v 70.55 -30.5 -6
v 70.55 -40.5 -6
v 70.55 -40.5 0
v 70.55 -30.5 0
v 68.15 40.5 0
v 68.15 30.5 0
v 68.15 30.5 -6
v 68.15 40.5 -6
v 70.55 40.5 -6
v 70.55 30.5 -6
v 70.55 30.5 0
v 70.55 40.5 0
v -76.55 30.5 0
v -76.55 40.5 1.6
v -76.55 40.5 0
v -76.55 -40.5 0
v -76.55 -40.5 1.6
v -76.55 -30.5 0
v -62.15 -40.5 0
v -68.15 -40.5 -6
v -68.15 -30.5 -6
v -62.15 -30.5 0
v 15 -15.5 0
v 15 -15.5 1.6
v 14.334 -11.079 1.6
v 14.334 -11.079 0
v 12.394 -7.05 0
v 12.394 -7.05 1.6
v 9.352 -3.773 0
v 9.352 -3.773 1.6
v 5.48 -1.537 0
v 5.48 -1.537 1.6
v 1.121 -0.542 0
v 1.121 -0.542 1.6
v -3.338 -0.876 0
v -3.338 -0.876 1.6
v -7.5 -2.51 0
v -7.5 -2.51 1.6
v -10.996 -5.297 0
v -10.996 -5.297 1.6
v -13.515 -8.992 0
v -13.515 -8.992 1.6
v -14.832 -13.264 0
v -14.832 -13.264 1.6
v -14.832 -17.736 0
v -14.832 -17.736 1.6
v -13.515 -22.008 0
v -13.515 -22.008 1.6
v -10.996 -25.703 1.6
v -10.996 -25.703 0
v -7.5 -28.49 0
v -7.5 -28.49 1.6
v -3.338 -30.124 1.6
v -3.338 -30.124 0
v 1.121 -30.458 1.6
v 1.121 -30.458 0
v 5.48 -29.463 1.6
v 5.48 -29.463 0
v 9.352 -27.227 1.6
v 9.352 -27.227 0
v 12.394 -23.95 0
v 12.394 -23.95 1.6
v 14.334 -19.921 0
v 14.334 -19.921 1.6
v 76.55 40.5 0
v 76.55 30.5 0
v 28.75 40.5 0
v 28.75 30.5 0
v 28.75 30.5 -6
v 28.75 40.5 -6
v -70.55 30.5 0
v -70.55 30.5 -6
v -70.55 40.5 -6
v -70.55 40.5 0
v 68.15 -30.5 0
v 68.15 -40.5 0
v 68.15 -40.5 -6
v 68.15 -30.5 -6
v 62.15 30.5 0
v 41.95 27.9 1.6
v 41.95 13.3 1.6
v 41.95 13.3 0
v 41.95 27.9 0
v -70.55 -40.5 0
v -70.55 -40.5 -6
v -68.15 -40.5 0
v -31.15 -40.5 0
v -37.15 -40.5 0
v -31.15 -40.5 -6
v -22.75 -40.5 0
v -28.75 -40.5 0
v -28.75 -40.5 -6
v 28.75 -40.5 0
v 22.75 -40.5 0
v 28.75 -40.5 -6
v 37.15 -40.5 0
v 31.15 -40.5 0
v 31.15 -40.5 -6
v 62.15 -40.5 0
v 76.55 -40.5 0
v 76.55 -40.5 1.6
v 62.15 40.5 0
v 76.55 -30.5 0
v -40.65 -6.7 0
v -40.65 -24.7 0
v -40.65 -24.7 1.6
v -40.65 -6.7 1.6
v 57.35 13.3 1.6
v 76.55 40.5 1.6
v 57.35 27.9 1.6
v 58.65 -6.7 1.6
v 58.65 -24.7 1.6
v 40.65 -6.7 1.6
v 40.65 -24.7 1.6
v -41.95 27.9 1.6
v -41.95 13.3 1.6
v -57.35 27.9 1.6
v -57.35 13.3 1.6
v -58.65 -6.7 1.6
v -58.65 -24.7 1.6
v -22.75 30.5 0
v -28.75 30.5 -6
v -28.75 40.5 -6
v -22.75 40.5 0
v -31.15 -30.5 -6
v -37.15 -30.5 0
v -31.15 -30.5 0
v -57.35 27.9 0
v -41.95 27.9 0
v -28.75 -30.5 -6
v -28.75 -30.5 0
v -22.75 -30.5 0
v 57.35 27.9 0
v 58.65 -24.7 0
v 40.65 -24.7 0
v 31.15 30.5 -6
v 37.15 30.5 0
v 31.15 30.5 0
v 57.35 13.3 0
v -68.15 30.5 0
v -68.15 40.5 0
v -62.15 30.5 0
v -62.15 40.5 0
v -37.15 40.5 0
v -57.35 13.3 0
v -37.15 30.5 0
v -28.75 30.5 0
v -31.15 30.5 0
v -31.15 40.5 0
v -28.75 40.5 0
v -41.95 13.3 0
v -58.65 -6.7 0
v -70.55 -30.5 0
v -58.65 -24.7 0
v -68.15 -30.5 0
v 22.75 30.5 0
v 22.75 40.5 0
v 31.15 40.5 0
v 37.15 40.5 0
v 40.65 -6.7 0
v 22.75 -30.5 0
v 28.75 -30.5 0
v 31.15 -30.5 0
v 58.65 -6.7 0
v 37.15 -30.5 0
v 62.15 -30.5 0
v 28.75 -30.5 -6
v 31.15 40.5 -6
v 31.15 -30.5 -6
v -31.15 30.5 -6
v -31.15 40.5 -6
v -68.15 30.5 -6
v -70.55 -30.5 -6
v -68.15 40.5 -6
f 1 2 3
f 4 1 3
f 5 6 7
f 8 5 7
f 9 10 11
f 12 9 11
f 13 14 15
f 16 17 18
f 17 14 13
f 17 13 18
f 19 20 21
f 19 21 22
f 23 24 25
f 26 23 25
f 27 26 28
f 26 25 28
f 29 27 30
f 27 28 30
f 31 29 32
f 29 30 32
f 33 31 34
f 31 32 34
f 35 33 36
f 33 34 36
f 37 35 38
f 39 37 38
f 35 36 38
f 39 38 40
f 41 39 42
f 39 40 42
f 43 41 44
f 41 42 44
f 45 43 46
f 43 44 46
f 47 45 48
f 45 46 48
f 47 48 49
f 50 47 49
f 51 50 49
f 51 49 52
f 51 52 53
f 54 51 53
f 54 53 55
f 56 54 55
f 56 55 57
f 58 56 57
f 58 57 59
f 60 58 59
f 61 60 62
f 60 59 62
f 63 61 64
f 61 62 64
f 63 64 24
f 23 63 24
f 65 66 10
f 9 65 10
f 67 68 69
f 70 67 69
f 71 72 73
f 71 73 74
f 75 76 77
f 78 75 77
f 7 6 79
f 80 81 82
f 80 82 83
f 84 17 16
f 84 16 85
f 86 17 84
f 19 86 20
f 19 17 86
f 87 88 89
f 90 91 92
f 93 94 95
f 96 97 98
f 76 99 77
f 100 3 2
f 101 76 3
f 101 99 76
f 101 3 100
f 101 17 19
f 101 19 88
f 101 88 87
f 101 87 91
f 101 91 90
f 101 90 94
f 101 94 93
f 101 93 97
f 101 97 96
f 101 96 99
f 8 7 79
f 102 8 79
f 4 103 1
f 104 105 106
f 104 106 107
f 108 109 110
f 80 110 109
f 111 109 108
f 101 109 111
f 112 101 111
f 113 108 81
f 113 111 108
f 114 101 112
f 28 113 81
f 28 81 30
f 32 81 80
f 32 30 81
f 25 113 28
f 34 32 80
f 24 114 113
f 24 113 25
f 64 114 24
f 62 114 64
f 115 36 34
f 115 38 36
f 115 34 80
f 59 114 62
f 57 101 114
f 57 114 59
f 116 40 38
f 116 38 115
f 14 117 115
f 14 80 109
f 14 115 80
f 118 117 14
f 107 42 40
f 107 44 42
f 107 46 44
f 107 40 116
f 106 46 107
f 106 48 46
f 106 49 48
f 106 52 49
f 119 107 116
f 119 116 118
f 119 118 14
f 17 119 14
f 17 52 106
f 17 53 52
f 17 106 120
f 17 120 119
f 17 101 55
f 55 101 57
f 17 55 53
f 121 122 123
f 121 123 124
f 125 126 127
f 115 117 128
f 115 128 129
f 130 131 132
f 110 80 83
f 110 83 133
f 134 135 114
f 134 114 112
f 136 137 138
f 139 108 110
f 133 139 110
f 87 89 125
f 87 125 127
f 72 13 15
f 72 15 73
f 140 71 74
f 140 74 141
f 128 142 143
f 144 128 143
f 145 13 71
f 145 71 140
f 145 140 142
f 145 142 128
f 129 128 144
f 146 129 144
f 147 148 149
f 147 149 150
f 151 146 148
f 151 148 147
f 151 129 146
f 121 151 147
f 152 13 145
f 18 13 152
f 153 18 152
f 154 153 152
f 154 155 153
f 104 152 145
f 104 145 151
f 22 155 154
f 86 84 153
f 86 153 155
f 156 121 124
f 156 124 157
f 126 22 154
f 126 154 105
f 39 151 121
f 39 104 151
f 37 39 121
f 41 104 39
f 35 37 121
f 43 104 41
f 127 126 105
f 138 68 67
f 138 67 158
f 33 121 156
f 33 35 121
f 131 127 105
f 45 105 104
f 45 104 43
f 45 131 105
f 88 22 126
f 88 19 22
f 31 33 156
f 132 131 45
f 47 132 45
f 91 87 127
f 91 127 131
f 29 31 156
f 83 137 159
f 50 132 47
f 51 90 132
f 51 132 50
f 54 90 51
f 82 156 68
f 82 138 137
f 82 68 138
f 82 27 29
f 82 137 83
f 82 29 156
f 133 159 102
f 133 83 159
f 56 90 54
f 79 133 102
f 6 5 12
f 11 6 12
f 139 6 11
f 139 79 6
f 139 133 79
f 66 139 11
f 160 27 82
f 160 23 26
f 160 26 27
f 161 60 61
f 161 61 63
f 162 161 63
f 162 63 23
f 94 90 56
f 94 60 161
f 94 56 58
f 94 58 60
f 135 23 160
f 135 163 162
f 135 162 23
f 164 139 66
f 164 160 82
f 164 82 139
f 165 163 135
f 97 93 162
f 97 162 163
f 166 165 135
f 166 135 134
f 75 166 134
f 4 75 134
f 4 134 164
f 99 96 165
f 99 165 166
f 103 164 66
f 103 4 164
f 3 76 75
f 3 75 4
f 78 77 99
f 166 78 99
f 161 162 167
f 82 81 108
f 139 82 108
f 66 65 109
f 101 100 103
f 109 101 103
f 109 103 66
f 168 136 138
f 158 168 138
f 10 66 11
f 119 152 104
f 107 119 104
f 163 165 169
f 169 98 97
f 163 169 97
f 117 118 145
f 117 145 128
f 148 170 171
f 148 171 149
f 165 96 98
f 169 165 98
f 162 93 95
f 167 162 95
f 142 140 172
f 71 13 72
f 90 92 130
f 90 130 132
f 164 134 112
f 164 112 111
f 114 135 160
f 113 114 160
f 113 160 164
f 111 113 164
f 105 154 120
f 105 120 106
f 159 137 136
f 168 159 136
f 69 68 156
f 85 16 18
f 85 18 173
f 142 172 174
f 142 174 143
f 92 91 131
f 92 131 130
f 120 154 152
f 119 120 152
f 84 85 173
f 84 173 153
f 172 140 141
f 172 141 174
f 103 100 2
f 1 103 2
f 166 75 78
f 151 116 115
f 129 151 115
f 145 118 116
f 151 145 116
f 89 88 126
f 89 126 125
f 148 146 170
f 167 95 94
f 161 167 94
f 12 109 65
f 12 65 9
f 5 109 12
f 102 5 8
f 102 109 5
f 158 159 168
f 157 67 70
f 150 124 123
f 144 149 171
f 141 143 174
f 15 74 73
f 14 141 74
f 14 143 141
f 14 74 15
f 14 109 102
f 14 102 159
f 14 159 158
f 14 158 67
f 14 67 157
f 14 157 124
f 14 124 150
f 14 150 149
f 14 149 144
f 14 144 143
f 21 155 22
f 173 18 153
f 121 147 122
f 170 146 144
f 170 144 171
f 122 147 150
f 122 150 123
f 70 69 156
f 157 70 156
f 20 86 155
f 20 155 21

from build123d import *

# Parameters (mm, degrees)
F2_DEPTH  = 81
F3_DEPTH  = 10
F4_START  = -71
F4_DEPTH  = 10
F8_R      = 15
F9_DEPTH  = 1.6
F10_W     = 15.4
F10_H     = 14.6
F11_DEPTH = 1.6
F12_W     = 18
F12_H     = 18
F13_DEPTH = 1.6


# Not quite as in the source:
# - a feature names something its author has since deleted; it is built from what else it names


with BuildPart() as f2:
    # F1 (on offset) → F2 (new body)
    with BuildSketch(Plane.XZ.offset(40.5)):
        Polygon((76.55, 0), (76.55, 1.6), (-76.55, 1.6), (-76.55, 0), (-70.55, 0), (-68.15, 0), (-62.15, 0), (-37.15, 0), (-31.15, 0), (-28.75, 0), (-22.75, 0), (22.75, 0), (28.75, 0), (31.15, 0), (37.15, 0), (62.15, 0), (68.15, 0), (70.55, 0), align=None)
    extrude(amount=-F2_DEPTH)

    # F1 (on offset) → F3 (join)
    with BuildSketch(Plane.XZ.offset(40.5)):
        Polygon((-62.15, 0), (-68.15, 0), (-68.15, -6), align=None)
        Polygon((-31.15, 0), (-37.15, 0), (-31.15, -6), align=None)
        Polygon((-22.75, 0), (-28.75, 0), (-28.75, -6), align=None)
        Polygon((-70.55, 0), (-76.55, 0), (-70.55, -6), align=None)
    extrude(amount=-F3_DEPTH)

    # F1 (on offset) → F4 (join)
    with BuildSketch(Plane.XZ.offset(40.5).offset(F4_START)):
        Polygon((-62.15, 0), (-68.15, 0), (-68.15, -6), align=None)
        Polygon((-31.15, 0), (-37.15, 0), (-31.15, -6), align=None)
        Polygon((-22.75, 0), (-28.75, 0), (-28.75, -6), align=None)
        Polygon((-70.55, 0), (-76.55, 0), (-70.55, -6), align=None)
    extrude(amount=-F4_DEPTH)

    # F7: F2 across plane


with BuildPart() as f2_1:
    add(f2.part)
    add(f2.part.mirror(Plane.YZ))

    # F8 (on face) → F9 (cut)
    with BuildSketch(Plane.XY.offset(1.6)):
        with Locations((0, -15.5)):
            Circle(F8_R)
    extrude(amount=-F9_DEPTH, mode=Mode.SUBTRACT)

    # F10 (on face) → F11 (cut)
    with BuildSketch(Plane.XY.offset(1.6)):
        with Locations((-49.65, 20.6)):
            Rectangle(F10_W, F10_H)
        with Locations((49.65, 20.6)):
            Rectangle(F10_W, F10_H)
    extrude(amount=-F11_DEPTH, mode=Mode.SUBTRACT)

    # F12 (on Top) → F13 (cut)
    with BuildSketch(Plane.XY):
        with Locations((-49.65, -15.7)):
            Rectangle(F12_W, F12_H)
        with Locations((49.65, -15.7)):
            Rectangle(F12_W, F12_H)
    extrude(amount=F13_DEPTH, mode=Mode.SUBTRACT)


solid = f2_1.part
